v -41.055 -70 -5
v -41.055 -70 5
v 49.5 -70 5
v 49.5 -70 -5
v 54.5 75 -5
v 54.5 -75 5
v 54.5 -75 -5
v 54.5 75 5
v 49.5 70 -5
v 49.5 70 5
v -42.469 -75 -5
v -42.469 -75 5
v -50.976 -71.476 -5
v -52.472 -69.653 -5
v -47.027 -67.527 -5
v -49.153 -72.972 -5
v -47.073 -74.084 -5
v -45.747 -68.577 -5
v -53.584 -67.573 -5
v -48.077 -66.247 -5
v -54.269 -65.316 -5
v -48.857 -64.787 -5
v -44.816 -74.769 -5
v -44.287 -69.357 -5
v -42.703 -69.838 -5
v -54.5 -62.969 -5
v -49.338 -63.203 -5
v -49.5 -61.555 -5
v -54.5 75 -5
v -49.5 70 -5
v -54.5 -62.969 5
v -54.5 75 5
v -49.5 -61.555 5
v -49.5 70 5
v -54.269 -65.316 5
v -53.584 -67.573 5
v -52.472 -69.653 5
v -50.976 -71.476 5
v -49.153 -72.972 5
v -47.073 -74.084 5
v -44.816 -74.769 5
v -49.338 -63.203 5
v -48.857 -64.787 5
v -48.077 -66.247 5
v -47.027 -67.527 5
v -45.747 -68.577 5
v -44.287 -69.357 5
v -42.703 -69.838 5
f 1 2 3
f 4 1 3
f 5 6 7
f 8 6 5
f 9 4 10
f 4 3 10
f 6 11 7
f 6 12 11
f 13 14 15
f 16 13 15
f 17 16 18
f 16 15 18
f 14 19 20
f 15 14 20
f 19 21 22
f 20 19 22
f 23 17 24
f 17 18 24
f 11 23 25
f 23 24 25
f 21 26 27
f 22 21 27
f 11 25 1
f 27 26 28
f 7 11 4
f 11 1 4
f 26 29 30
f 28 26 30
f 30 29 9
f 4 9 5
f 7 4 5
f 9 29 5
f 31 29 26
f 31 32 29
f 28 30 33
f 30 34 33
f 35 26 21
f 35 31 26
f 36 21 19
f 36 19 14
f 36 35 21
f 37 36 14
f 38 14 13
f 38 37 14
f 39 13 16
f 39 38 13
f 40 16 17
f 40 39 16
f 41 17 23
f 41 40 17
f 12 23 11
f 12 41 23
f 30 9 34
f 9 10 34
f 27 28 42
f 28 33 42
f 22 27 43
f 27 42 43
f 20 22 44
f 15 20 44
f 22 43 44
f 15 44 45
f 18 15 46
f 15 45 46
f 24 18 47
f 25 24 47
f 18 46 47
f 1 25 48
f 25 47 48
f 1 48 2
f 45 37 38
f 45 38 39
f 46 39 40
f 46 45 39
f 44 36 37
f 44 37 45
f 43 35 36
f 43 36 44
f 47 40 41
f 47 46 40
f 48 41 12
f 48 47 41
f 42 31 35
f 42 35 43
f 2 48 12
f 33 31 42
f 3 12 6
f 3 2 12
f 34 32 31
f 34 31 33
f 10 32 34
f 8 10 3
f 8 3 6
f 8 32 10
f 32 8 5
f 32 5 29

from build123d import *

# Parameters (mm, degrees)
PAD_DEPTH = 5


with BuildPart() as part:
    # Sketch → Pad (new body, symmetric)
    with BuildSketch(Plane.XY):
        with BuildLine():
            Line((-42.469309, -75), (54.5, -75))
            Line((54.5, -75), (54.5, 75))
            Line((54.5, 75), (-54.5, 75))
            Line((-54.5, 75), (-54.5, -62.969309))
            ThreePointArc((-54.5, -62.969309), (-50.976292, -71.476292), (-42.469309, -75))
        make_face()
        with BuildLine():
            Line((-41.055096, -70), (49.5, -70))
            Line((49.5, -70), (49.5, 70))
            Line((49.5, 70), (-49.5, 70))
            Line((-49.5, 70), (-49.5, -61.555096))
            ThreePointArc((-49.5, -61.555096), (-47.026545, -67.526545), (-41.055096, -70))
        make_face(mode=Mode.SUBTRACT)
    extrude(amount=PAD_DEPTH, both=True)


solid = part.part
